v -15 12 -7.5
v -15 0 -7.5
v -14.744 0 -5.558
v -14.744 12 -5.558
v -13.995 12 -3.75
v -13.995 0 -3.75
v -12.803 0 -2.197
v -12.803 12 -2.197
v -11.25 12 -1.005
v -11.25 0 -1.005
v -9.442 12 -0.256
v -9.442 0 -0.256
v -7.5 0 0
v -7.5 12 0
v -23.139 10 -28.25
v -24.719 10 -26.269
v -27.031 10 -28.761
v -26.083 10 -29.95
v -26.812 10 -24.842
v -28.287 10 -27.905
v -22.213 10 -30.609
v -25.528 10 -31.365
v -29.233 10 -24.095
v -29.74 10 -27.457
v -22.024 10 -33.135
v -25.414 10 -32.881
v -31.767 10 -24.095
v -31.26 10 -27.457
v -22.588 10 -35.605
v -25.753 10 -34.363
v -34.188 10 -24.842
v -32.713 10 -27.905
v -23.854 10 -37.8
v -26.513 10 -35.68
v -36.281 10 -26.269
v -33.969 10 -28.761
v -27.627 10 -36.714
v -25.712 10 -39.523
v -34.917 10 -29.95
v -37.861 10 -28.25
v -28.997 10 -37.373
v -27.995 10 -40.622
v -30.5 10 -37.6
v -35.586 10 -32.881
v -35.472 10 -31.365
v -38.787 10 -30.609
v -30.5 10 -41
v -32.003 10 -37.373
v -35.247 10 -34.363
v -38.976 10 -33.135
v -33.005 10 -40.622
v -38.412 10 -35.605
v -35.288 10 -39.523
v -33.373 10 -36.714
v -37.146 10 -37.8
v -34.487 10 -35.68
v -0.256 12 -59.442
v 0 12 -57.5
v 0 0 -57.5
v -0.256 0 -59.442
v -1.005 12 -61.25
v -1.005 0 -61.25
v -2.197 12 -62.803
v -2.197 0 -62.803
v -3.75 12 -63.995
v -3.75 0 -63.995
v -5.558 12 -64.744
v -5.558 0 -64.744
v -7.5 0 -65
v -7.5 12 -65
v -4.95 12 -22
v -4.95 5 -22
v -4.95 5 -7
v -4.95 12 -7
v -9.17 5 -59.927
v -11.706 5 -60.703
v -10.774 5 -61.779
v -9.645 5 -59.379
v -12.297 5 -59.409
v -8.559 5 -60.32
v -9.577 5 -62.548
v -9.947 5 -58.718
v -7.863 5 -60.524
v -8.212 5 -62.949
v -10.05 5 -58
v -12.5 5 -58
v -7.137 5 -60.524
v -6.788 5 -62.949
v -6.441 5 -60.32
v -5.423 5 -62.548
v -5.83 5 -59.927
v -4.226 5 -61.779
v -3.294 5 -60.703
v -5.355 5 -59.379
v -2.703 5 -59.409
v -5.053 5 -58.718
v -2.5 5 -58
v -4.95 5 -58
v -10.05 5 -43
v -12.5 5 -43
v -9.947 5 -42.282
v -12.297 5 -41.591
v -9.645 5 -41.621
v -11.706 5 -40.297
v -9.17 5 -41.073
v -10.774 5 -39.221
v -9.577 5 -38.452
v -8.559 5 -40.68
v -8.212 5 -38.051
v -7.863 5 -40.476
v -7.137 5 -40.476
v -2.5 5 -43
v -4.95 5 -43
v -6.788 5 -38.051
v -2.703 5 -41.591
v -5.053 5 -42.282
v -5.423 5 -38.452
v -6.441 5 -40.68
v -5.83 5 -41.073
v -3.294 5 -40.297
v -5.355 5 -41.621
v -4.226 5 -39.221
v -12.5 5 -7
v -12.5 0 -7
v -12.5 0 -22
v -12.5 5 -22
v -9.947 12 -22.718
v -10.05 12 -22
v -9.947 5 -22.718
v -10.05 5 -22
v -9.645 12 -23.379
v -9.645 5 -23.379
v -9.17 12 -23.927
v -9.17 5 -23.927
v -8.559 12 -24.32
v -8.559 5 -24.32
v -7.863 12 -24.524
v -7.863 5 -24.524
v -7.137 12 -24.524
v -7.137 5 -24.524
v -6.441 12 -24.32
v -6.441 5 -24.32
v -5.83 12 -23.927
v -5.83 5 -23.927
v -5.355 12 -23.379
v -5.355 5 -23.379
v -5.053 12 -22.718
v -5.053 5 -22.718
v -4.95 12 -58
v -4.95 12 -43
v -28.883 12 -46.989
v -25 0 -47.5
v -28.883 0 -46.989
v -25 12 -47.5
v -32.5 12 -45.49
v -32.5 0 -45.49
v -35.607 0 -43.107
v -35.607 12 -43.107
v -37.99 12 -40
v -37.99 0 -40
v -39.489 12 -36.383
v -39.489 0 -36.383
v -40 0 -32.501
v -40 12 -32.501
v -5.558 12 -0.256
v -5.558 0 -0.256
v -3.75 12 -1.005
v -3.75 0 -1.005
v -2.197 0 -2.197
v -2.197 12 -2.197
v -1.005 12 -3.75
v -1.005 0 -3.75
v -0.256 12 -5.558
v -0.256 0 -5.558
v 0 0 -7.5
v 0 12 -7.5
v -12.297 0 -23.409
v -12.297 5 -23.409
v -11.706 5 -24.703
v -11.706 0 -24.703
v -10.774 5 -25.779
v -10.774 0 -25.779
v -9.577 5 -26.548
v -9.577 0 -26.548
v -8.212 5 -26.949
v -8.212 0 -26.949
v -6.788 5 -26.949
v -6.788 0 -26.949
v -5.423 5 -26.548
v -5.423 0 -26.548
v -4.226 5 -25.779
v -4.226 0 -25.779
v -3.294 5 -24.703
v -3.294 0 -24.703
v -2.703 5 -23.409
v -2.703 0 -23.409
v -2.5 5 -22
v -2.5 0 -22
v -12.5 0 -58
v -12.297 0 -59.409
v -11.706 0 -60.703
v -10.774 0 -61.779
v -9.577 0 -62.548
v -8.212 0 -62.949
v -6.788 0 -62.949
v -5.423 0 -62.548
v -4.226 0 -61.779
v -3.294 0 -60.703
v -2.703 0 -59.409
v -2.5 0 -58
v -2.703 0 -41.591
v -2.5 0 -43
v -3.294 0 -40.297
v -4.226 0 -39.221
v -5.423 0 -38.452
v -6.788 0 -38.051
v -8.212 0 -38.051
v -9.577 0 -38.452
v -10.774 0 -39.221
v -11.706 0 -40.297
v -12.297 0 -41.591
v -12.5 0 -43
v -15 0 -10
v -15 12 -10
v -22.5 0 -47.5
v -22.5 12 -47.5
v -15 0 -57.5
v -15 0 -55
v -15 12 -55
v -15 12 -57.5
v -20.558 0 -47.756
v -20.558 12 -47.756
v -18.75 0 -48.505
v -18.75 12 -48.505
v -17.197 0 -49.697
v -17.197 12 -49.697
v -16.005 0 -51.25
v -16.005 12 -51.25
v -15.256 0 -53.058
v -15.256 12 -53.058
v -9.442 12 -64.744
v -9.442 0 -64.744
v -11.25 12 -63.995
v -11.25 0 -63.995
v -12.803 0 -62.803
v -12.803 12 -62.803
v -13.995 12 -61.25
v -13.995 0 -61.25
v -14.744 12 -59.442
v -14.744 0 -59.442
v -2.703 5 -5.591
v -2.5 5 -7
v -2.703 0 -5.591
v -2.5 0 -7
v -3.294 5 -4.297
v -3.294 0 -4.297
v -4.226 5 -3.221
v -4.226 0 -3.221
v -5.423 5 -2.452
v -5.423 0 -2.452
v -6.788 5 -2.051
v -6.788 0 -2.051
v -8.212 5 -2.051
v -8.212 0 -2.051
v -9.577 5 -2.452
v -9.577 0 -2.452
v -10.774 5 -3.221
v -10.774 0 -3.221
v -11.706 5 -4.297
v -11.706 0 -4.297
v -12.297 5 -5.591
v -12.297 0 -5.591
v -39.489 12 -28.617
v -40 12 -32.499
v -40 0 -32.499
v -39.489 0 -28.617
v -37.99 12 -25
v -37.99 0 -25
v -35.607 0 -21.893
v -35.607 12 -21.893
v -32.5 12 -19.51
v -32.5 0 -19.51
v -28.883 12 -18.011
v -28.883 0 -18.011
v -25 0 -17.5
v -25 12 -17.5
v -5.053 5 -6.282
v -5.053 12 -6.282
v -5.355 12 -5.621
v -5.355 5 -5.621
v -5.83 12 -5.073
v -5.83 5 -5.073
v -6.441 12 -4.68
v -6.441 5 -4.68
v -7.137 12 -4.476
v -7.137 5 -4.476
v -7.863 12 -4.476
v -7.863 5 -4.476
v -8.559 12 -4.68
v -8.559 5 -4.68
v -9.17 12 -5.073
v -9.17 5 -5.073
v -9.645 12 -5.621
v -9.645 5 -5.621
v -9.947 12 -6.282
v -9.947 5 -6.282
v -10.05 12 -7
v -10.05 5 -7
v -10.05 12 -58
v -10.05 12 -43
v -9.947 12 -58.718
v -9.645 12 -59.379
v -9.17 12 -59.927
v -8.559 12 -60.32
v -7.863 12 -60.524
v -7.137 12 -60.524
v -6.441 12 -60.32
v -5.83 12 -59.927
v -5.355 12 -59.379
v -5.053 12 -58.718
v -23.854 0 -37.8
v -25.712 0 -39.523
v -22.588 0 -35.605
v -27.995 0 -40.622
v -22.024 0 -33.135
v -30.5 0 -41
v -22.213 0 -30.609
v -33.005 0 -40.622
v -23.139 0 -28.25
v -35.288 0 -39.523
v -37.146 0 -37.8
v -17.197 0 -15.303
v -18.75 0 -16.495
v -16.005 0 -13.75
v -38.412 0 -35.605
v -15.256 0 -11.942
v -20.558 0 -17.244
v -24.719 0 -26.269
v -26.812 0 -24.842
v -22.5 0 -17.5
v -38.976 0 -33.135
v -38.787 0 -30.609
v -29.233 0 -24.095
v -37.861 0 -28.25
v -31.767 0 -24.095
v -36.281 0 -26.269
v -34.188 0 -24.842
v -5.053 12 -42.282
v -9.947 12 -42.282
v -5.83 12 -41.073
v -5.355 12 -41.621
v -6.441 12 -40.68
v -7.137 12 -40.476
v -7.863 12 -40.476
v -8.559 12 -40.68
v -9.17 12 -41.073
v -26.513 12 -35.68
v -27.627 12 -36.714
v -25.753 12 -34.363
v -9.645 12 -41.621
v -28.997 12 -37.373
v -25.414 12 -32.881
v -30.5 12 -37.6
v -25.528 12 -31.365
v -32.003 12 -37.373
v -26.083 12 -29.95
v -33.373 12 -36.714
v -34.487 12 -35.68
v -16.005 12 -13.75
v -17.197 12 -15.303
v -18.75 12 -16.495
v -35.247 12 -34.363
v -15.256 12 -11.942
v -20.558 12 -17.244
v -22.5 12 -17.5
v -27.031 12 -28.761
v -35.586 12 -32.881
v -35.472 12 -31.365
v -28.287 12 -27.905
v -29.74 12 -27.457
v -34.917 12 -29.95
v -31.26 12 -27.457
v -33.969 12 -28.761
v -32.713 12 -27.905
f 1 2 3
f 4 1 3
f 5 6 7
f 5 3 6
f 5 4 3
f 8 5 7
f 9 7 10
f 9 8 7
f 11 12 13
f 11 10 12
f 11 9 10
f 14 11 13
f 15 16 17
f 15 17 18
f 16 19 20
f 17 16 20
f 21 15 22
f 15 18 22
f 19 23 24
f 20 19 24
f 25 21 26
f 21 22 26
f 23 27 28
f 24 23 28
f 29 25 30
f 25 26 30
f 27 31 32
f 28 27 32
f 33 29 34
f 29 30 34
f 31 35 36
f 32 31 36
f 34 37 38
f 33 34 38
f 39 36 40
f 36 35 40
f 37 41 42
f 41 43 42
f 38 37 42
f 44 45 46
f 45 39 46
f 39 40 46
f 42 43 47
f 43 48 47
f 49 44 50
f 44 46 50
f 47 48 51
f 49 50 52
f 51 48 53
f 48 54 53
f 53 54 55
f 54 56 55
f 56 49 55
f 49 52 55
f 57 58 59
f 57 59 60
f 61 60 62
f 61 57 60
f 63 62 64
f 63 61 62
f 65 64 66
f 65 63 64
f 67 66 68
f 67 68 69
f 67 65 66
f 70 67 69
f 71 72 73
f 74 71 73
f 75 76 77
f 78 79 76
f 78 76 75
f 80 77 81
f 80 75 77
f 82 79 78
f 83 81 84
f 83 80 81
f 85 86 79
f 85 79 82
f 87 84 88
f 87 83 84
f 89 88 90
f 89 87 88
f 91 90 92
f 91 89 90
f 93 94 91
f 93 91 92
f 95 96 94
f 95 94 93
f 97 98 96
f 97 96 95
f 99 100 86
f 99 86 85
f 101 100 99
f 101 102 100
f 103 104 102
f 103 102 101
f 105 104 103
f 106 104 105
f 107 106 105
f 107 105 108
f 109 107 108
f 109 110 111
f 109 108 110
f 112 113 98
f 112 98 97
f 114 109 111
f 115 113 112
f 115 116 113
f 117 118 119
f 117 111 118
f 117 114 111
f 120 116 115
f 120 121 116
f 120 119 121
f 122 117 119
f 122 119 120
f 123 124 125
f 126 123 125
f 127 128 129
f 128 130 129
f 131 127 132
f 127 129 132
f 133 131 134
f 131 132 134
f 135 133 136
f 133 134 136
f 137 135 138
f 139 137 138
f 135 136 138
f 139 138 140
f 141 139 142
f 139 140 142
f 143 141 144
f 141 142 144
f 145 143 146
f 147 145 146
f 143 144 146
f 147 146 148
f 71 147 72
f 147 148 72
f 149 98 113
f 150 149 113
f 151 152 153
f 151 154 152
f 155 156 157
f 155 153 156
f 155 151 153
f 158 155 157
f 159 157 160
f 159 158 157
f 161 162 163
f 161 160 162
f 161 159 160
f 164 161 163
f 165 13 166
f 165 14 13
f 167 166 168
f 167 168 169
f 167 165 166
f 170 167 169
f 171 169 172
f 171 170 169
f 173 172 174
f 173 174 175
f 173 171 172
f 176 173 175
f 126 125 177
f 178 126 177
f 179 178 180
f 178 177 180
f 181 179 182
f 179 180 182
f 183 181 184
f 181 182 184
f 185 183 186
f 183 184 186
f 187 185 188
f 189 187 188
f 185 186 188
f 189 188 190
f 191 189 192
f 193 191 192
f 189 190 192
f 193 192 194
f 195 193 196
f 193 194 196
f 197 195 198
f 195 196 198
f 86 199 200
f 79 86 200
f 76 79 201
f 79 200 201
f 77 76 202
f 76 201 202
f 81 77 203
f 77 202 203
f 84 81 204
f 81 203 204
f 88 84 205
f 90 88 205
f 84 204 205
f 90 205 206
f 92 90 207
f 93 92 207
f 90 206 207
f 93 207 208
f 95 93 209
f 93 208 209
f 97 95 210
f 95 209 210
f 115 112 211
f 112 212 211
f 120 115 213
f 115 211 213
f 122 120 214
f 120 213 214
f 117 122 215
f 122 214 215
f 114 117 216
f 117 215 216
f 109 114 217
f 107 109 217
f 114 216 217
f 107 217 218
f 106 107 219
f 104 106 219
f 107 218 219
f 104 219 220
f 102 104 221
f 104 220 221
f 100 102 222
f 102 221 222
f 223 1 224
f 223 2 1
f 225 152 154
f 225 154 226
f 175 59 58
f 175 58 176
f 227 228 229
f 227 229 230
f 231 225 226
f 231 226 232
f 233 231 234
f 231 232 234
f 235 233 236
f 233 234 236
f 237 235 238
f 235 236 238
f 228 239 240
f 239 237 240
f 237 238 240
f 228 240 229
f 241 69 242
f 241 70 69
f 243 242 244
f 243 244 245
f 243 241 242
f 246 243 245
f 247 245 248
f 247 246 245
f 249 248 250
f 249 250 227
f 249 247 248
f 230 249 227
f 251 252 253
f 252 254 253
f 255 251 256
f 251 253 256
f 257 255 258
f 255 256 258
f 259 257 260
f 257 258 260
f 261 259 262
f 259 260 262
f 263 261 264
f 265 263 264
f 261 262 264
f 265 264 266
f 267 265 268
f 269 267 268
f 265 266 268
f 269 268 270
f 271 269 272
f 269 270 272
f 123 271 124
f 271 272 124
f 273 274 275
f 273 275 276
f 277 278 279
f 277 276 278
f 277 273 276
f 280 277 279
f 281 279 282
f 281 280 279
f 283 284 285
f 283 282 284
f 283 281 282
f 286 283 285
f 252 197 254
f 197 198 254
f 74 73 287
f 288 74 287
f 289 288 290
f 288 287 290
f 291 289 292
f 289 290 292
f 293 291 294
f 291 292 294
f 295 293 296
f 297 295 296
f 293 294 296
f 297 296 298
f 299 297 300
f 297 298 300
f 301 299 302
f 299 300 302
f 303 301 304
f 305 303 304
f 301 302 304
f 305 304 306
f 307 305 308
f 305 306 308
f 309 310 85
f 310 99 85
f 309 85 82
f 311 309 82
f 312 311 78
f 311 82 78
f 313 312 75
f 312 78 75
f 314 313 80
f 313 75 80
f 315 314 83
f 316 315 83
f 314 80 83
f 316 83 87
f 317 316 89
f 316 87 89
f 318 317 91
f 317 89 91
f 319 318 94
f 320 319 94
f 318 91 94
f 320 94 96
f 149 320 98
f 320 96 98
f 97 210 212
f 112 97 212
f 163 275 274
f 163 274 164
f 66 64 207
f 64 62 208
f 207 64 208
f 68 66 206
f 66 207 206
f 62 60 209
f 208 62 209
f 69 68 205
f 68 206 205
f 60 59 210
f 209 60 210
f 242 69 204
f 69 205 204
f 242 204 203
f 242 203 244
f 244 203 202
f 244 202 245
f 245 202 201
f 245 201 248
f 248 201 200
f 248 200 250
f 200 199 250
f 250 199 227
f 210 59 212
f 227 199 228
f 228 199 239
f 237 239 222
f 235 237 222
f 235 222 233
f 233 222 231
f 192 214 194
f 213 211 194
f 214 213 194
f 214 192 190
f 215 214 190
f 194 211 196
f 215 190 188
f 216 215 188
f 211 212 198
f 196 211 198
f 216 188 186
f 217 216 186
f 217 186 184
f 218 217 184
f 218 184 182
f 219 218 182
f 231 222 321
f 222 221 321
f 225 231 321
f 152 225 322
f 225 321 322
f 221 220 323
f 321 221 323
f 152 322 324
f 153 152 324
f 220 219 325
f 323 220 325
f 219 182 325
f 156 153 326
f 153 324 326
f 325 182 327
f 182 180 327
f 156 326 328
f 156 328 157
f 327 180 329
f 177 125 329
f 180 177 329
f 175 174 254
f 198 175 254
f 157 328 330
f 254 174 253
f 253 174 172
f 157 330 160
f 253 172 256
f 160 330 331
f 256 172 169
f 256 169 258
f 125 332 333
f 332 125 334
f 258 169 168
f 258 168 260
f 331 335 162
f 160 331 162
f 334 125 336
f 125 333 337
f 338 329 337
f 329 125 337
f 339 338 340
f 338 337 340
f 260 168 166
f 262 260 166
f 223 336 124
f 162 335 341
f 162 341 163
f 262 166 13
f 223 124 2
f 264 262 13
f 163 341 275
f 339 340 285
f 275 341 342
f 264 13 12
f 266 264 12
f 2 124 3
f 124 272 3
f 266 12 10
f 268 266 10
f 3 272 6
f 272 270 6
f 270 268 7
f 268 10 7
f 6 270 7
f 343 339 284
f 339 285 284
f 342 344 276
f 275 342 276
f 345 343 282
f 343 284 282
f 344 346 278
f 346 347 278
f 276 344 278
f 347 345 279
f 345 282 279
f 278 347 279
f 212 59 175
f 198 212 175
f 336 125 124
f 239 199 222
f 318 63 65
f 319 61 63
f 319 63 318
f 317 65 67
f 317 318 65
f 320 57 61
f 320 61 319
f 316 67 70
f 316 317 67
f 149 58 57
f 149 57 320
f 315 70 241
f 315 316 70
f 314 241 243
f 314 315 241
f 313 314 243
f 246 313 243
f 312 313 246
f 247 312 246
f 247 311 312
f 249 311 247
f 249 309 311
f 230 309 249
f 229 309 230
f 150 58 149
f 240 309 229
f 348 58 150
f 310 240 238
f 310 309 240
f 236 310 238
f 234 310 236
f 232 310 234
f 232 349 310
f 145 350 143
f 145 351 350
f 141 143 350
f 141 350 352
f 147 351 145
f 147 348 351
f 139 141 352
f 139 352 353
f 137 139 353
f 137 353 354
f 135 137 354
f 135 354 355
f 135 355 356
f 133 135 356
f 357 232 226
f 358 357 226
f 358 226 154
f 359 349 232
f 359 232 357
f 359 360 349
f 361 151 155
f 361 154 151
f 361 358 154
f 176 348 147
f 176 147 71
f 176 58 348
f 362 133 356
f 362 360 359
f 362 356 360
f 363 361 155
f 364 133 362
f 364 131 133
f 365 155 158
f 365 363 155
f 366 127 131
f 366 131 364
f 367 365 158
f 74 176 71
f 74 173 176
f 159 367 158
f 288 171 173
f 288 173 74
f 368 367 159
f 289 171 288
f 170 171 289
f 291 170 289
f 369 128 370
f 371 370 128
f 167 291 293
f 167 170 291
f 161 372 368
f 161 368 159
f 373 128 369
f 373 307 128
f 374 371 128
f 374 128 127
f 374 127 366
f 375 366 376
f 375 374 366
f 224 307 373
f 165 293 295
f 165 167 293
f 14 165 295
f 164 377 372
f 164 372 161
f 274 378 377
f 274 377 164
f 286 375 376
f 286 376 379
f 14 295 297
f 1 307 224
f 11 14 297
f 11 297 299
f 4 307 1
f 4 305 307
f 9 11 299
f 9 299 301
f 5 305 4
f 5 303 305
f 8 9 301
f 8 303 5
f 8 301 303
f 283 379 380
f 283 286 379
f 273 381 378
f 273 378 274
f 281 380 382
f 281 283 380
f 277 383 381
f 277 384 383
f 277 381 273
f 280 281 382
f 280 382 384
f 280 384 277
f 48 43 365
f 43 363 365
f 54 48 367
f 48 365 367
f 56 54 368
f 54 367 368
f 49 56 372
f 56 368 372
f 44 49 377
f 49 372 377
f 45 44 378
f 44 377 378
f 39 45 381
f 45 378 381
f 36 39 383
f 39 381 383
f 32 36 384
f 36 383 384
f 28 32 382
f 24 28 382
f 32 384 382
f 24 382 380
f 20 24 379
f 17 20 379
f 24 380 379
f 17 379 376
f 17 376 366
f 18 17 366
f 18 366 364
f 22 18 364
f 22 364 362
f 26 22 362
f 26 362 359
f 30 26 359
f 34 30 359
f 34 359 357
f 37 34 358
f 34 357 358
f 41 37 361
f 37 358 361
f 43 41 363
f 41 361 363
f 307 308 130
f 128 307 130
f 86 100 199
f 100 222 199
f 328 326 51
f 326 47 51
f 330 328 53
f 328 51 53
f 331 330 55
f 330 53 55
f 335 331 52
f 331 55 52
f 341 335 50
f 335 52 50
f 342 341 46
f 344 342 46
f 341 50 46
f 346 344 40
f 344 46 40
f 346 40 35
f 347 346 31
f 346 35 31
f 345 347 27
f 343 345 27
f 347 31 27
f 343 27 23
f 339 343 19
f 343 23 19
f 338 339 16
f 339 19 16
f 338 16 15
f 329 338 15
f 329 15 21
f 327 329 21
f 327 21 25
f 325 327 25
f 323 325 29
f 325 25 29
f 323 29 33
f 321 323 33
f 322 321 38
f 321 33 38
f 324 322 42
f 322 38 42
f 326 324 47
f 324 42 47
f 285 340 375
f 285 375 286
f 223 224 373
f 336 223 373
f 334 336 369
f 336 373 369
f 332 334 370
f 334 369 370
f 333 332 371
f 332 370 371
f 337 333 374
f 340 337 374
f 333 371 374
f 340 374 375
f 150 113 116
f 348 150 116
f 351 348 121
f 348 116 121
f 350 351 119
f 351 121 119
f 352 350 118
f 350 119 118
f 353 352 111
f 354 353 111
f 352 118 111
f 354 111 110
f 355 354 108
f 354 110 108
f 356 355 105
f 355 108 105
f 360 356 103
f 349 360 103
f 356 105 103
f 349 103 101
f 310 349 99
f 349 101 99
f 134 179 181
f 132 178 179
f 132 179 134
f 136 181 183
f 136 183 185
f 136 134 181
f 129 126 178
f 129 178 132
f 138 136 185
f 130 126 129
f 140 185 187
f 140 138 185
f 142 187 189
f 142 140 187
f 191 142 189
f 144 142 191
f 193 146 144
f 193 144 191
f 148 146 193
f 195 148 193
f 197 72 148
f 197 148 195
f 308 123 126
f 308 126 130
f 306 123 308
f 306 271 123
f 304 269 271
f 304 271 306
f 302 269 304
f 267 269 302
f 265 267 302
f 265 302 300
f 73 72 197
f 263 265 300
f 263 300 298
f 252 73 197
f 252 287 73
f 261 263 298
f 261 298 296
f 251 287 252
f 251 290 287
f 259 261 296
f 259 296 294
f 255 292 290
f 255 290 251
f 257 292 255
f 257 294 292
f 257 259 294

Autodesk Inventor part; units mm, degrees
ref_plane "YZ Plane" through (0, 0, 0) normal (1, 0, 0) x (0, 1, 0)
ref_plane "XZ Plane" through (0, 0, 0) normal (0, 1, 0) x (-1, 0, 0)
ref_plane "XY Plane" through (0, 0, 0) normal (0, 0, 1) x (1, 0, 0)
sketch "Skizze1" plane through (0, 0, 0) normal (0, 1, 0) x (-1, 0, 0)
  line L0 (0, 0) -> (15, 0)
  line L1 (15, 0) -> (15, -17.5)
  line L2 (15, -17.5) -> (40, -17.5)
  line L3 (40, -17.5) -> (40, -47.5)
  line L4 (40, -47.5) -> (15, -47.5)
  line L5 (15, -47.5) -> (15, -65)
  line L6 (15, -65) -> (0, -65)
  line L7 (0, -65) -> (0, 0)
  dimension "d0" = 65
  dimension "d1" = 30
  dimension "d2" = 15
  dimension "d3" = 40
  dimension "d6" = 25
extrude "Extrusion3" add sketch "Skizze1" along normal blind 12
sketch "Skizze5" plane through (0, 0, 0) normal (0, -1, 0) x (1, 0, 0)
  line L0 (-7.5, -58) -> (-7.5, -43) construction
  line L1 (-4.95, -58) -> (-4.95, -43)
  line L2 (-10.05, -43) -> (-10.05, -58)
  arc A0 (-10.05, -58) -> (-4.95, -58) centre (-7.5, -58) ccw
  arc A1 (-4.95, -43) -> (-10.05, -43) centre (-7.5, -43) ccw
  line L3 (-7.5, -22) -> (-7.5, -7) construction
  line L4 (-4.95, -22) -> (-4.95, -7)
  line L5 (-10.05, -7) -> (-10.05, -22)
  arc A2 (-10.05, -22) -> (-4.95, -22) centre (-7.5, -22) ccw
  arc A3 (-4.95, -7) -> (-10.05, -7) centre (-7.5, -7) ccw
  line L6 (0, -65) -> (-15, -65) projected
  line L7 (-15, 0) -> (0, 0) projected
  line L8 (-15, -65) -> (-15, -47.5) projected
  line L9 (0, 0) -> (0, -65) projected
  point P0 (-7.5, -50.5)
  point P1 (-7.5, -14.5)
  dimension "d52" = 5.1
  dimension "d53" = 5.1
  dimension "d54" = 15
  dimension "d55" = 15
  dimension "d56" = 7
  dimension "d58" = 7
  dimension "d59" = 15
  dimension "d60" = 7.5
  dimension "d76" = 36
extrude "Extrusion5" cut sketch "Skizze5" against normal through all
sketch "Skizze6" plane through (0, 0, 0) normal (0, -1, 0) x (1, 0, 0)
  line L0 (-7.5, -58) -> (-7.5, -43) construction
  line L1 (-2.5, -58) -> (-2.5, -43)
  line L2 (-12.5, -43) -> (-12.5, -58)
  arc A0 (-12.5, -58) -> (-2.5, -58) centre (-7.5, -58) ccw
  arc A1 (-2.5, -43) -> (-12.5, -43) centre (-7.5, -43) ccw
  line L3 (-7.5, -22) -> (-7.5, -7) construction
  line L4 (-2.5, -22) -> (-2.5, -7)
  line L5 (-12.5, -7) -> (-12.5, -22)
  arc A2 (-12.5, -22) -> (-2.5, -22) centre (-7.5, -22) ccw
  arc A3 (-2.5, -7) -> (-12.5, -7) centre (-7.5, -7) ccw
  line L6 (-15, 0) -> (0, 0) projected
  line L7 (0, 0) -> (0, -65) projected
  point P0 (-7.5, -50.5)
  point P1 (-7.5, -14.5)
  dimension "d63" = 10
  dimension "d64" = 10
  dimension "d65" = 15
  dimension "d66" = 15
  dimension "d67" = 7
  dimension "d68" = 7.5
  dimension "d69" = 7.5
  dimension "d70" = 7
extrude "Extrusion6" cut sketch "Skizze6" against normal blind 5
fillet "Rundung4" radius 7.5 6 edges at (-15, 6, -65) (0, 6, -65) (0, 6, 0) (-15, 6, 0) (-15, 6, -17.5) (-15, 6, -47.5)
fillet "Rundung5" radius 15 2 edges at (-40, 6, -47.5) (-40, 6, -17.5)
sketch "Skizze7" plane through (0, 0, 0) normal (0, -1, 0) x (1, 0, 0)
  circle A0 centre (-30.5, -32.5) radius 3.7991
  point P0 (0, 0)
  dimension "d77" = 32.5
  dimension "d78" = 30.5
hole "Bohrung1" at (-30.5, 0, -32.5) direction (0, 1, 0) diameter 10.2 end through all counterbore diameter 17 counterbore depth 10
properties part number "Lampenhalterung1,0"
